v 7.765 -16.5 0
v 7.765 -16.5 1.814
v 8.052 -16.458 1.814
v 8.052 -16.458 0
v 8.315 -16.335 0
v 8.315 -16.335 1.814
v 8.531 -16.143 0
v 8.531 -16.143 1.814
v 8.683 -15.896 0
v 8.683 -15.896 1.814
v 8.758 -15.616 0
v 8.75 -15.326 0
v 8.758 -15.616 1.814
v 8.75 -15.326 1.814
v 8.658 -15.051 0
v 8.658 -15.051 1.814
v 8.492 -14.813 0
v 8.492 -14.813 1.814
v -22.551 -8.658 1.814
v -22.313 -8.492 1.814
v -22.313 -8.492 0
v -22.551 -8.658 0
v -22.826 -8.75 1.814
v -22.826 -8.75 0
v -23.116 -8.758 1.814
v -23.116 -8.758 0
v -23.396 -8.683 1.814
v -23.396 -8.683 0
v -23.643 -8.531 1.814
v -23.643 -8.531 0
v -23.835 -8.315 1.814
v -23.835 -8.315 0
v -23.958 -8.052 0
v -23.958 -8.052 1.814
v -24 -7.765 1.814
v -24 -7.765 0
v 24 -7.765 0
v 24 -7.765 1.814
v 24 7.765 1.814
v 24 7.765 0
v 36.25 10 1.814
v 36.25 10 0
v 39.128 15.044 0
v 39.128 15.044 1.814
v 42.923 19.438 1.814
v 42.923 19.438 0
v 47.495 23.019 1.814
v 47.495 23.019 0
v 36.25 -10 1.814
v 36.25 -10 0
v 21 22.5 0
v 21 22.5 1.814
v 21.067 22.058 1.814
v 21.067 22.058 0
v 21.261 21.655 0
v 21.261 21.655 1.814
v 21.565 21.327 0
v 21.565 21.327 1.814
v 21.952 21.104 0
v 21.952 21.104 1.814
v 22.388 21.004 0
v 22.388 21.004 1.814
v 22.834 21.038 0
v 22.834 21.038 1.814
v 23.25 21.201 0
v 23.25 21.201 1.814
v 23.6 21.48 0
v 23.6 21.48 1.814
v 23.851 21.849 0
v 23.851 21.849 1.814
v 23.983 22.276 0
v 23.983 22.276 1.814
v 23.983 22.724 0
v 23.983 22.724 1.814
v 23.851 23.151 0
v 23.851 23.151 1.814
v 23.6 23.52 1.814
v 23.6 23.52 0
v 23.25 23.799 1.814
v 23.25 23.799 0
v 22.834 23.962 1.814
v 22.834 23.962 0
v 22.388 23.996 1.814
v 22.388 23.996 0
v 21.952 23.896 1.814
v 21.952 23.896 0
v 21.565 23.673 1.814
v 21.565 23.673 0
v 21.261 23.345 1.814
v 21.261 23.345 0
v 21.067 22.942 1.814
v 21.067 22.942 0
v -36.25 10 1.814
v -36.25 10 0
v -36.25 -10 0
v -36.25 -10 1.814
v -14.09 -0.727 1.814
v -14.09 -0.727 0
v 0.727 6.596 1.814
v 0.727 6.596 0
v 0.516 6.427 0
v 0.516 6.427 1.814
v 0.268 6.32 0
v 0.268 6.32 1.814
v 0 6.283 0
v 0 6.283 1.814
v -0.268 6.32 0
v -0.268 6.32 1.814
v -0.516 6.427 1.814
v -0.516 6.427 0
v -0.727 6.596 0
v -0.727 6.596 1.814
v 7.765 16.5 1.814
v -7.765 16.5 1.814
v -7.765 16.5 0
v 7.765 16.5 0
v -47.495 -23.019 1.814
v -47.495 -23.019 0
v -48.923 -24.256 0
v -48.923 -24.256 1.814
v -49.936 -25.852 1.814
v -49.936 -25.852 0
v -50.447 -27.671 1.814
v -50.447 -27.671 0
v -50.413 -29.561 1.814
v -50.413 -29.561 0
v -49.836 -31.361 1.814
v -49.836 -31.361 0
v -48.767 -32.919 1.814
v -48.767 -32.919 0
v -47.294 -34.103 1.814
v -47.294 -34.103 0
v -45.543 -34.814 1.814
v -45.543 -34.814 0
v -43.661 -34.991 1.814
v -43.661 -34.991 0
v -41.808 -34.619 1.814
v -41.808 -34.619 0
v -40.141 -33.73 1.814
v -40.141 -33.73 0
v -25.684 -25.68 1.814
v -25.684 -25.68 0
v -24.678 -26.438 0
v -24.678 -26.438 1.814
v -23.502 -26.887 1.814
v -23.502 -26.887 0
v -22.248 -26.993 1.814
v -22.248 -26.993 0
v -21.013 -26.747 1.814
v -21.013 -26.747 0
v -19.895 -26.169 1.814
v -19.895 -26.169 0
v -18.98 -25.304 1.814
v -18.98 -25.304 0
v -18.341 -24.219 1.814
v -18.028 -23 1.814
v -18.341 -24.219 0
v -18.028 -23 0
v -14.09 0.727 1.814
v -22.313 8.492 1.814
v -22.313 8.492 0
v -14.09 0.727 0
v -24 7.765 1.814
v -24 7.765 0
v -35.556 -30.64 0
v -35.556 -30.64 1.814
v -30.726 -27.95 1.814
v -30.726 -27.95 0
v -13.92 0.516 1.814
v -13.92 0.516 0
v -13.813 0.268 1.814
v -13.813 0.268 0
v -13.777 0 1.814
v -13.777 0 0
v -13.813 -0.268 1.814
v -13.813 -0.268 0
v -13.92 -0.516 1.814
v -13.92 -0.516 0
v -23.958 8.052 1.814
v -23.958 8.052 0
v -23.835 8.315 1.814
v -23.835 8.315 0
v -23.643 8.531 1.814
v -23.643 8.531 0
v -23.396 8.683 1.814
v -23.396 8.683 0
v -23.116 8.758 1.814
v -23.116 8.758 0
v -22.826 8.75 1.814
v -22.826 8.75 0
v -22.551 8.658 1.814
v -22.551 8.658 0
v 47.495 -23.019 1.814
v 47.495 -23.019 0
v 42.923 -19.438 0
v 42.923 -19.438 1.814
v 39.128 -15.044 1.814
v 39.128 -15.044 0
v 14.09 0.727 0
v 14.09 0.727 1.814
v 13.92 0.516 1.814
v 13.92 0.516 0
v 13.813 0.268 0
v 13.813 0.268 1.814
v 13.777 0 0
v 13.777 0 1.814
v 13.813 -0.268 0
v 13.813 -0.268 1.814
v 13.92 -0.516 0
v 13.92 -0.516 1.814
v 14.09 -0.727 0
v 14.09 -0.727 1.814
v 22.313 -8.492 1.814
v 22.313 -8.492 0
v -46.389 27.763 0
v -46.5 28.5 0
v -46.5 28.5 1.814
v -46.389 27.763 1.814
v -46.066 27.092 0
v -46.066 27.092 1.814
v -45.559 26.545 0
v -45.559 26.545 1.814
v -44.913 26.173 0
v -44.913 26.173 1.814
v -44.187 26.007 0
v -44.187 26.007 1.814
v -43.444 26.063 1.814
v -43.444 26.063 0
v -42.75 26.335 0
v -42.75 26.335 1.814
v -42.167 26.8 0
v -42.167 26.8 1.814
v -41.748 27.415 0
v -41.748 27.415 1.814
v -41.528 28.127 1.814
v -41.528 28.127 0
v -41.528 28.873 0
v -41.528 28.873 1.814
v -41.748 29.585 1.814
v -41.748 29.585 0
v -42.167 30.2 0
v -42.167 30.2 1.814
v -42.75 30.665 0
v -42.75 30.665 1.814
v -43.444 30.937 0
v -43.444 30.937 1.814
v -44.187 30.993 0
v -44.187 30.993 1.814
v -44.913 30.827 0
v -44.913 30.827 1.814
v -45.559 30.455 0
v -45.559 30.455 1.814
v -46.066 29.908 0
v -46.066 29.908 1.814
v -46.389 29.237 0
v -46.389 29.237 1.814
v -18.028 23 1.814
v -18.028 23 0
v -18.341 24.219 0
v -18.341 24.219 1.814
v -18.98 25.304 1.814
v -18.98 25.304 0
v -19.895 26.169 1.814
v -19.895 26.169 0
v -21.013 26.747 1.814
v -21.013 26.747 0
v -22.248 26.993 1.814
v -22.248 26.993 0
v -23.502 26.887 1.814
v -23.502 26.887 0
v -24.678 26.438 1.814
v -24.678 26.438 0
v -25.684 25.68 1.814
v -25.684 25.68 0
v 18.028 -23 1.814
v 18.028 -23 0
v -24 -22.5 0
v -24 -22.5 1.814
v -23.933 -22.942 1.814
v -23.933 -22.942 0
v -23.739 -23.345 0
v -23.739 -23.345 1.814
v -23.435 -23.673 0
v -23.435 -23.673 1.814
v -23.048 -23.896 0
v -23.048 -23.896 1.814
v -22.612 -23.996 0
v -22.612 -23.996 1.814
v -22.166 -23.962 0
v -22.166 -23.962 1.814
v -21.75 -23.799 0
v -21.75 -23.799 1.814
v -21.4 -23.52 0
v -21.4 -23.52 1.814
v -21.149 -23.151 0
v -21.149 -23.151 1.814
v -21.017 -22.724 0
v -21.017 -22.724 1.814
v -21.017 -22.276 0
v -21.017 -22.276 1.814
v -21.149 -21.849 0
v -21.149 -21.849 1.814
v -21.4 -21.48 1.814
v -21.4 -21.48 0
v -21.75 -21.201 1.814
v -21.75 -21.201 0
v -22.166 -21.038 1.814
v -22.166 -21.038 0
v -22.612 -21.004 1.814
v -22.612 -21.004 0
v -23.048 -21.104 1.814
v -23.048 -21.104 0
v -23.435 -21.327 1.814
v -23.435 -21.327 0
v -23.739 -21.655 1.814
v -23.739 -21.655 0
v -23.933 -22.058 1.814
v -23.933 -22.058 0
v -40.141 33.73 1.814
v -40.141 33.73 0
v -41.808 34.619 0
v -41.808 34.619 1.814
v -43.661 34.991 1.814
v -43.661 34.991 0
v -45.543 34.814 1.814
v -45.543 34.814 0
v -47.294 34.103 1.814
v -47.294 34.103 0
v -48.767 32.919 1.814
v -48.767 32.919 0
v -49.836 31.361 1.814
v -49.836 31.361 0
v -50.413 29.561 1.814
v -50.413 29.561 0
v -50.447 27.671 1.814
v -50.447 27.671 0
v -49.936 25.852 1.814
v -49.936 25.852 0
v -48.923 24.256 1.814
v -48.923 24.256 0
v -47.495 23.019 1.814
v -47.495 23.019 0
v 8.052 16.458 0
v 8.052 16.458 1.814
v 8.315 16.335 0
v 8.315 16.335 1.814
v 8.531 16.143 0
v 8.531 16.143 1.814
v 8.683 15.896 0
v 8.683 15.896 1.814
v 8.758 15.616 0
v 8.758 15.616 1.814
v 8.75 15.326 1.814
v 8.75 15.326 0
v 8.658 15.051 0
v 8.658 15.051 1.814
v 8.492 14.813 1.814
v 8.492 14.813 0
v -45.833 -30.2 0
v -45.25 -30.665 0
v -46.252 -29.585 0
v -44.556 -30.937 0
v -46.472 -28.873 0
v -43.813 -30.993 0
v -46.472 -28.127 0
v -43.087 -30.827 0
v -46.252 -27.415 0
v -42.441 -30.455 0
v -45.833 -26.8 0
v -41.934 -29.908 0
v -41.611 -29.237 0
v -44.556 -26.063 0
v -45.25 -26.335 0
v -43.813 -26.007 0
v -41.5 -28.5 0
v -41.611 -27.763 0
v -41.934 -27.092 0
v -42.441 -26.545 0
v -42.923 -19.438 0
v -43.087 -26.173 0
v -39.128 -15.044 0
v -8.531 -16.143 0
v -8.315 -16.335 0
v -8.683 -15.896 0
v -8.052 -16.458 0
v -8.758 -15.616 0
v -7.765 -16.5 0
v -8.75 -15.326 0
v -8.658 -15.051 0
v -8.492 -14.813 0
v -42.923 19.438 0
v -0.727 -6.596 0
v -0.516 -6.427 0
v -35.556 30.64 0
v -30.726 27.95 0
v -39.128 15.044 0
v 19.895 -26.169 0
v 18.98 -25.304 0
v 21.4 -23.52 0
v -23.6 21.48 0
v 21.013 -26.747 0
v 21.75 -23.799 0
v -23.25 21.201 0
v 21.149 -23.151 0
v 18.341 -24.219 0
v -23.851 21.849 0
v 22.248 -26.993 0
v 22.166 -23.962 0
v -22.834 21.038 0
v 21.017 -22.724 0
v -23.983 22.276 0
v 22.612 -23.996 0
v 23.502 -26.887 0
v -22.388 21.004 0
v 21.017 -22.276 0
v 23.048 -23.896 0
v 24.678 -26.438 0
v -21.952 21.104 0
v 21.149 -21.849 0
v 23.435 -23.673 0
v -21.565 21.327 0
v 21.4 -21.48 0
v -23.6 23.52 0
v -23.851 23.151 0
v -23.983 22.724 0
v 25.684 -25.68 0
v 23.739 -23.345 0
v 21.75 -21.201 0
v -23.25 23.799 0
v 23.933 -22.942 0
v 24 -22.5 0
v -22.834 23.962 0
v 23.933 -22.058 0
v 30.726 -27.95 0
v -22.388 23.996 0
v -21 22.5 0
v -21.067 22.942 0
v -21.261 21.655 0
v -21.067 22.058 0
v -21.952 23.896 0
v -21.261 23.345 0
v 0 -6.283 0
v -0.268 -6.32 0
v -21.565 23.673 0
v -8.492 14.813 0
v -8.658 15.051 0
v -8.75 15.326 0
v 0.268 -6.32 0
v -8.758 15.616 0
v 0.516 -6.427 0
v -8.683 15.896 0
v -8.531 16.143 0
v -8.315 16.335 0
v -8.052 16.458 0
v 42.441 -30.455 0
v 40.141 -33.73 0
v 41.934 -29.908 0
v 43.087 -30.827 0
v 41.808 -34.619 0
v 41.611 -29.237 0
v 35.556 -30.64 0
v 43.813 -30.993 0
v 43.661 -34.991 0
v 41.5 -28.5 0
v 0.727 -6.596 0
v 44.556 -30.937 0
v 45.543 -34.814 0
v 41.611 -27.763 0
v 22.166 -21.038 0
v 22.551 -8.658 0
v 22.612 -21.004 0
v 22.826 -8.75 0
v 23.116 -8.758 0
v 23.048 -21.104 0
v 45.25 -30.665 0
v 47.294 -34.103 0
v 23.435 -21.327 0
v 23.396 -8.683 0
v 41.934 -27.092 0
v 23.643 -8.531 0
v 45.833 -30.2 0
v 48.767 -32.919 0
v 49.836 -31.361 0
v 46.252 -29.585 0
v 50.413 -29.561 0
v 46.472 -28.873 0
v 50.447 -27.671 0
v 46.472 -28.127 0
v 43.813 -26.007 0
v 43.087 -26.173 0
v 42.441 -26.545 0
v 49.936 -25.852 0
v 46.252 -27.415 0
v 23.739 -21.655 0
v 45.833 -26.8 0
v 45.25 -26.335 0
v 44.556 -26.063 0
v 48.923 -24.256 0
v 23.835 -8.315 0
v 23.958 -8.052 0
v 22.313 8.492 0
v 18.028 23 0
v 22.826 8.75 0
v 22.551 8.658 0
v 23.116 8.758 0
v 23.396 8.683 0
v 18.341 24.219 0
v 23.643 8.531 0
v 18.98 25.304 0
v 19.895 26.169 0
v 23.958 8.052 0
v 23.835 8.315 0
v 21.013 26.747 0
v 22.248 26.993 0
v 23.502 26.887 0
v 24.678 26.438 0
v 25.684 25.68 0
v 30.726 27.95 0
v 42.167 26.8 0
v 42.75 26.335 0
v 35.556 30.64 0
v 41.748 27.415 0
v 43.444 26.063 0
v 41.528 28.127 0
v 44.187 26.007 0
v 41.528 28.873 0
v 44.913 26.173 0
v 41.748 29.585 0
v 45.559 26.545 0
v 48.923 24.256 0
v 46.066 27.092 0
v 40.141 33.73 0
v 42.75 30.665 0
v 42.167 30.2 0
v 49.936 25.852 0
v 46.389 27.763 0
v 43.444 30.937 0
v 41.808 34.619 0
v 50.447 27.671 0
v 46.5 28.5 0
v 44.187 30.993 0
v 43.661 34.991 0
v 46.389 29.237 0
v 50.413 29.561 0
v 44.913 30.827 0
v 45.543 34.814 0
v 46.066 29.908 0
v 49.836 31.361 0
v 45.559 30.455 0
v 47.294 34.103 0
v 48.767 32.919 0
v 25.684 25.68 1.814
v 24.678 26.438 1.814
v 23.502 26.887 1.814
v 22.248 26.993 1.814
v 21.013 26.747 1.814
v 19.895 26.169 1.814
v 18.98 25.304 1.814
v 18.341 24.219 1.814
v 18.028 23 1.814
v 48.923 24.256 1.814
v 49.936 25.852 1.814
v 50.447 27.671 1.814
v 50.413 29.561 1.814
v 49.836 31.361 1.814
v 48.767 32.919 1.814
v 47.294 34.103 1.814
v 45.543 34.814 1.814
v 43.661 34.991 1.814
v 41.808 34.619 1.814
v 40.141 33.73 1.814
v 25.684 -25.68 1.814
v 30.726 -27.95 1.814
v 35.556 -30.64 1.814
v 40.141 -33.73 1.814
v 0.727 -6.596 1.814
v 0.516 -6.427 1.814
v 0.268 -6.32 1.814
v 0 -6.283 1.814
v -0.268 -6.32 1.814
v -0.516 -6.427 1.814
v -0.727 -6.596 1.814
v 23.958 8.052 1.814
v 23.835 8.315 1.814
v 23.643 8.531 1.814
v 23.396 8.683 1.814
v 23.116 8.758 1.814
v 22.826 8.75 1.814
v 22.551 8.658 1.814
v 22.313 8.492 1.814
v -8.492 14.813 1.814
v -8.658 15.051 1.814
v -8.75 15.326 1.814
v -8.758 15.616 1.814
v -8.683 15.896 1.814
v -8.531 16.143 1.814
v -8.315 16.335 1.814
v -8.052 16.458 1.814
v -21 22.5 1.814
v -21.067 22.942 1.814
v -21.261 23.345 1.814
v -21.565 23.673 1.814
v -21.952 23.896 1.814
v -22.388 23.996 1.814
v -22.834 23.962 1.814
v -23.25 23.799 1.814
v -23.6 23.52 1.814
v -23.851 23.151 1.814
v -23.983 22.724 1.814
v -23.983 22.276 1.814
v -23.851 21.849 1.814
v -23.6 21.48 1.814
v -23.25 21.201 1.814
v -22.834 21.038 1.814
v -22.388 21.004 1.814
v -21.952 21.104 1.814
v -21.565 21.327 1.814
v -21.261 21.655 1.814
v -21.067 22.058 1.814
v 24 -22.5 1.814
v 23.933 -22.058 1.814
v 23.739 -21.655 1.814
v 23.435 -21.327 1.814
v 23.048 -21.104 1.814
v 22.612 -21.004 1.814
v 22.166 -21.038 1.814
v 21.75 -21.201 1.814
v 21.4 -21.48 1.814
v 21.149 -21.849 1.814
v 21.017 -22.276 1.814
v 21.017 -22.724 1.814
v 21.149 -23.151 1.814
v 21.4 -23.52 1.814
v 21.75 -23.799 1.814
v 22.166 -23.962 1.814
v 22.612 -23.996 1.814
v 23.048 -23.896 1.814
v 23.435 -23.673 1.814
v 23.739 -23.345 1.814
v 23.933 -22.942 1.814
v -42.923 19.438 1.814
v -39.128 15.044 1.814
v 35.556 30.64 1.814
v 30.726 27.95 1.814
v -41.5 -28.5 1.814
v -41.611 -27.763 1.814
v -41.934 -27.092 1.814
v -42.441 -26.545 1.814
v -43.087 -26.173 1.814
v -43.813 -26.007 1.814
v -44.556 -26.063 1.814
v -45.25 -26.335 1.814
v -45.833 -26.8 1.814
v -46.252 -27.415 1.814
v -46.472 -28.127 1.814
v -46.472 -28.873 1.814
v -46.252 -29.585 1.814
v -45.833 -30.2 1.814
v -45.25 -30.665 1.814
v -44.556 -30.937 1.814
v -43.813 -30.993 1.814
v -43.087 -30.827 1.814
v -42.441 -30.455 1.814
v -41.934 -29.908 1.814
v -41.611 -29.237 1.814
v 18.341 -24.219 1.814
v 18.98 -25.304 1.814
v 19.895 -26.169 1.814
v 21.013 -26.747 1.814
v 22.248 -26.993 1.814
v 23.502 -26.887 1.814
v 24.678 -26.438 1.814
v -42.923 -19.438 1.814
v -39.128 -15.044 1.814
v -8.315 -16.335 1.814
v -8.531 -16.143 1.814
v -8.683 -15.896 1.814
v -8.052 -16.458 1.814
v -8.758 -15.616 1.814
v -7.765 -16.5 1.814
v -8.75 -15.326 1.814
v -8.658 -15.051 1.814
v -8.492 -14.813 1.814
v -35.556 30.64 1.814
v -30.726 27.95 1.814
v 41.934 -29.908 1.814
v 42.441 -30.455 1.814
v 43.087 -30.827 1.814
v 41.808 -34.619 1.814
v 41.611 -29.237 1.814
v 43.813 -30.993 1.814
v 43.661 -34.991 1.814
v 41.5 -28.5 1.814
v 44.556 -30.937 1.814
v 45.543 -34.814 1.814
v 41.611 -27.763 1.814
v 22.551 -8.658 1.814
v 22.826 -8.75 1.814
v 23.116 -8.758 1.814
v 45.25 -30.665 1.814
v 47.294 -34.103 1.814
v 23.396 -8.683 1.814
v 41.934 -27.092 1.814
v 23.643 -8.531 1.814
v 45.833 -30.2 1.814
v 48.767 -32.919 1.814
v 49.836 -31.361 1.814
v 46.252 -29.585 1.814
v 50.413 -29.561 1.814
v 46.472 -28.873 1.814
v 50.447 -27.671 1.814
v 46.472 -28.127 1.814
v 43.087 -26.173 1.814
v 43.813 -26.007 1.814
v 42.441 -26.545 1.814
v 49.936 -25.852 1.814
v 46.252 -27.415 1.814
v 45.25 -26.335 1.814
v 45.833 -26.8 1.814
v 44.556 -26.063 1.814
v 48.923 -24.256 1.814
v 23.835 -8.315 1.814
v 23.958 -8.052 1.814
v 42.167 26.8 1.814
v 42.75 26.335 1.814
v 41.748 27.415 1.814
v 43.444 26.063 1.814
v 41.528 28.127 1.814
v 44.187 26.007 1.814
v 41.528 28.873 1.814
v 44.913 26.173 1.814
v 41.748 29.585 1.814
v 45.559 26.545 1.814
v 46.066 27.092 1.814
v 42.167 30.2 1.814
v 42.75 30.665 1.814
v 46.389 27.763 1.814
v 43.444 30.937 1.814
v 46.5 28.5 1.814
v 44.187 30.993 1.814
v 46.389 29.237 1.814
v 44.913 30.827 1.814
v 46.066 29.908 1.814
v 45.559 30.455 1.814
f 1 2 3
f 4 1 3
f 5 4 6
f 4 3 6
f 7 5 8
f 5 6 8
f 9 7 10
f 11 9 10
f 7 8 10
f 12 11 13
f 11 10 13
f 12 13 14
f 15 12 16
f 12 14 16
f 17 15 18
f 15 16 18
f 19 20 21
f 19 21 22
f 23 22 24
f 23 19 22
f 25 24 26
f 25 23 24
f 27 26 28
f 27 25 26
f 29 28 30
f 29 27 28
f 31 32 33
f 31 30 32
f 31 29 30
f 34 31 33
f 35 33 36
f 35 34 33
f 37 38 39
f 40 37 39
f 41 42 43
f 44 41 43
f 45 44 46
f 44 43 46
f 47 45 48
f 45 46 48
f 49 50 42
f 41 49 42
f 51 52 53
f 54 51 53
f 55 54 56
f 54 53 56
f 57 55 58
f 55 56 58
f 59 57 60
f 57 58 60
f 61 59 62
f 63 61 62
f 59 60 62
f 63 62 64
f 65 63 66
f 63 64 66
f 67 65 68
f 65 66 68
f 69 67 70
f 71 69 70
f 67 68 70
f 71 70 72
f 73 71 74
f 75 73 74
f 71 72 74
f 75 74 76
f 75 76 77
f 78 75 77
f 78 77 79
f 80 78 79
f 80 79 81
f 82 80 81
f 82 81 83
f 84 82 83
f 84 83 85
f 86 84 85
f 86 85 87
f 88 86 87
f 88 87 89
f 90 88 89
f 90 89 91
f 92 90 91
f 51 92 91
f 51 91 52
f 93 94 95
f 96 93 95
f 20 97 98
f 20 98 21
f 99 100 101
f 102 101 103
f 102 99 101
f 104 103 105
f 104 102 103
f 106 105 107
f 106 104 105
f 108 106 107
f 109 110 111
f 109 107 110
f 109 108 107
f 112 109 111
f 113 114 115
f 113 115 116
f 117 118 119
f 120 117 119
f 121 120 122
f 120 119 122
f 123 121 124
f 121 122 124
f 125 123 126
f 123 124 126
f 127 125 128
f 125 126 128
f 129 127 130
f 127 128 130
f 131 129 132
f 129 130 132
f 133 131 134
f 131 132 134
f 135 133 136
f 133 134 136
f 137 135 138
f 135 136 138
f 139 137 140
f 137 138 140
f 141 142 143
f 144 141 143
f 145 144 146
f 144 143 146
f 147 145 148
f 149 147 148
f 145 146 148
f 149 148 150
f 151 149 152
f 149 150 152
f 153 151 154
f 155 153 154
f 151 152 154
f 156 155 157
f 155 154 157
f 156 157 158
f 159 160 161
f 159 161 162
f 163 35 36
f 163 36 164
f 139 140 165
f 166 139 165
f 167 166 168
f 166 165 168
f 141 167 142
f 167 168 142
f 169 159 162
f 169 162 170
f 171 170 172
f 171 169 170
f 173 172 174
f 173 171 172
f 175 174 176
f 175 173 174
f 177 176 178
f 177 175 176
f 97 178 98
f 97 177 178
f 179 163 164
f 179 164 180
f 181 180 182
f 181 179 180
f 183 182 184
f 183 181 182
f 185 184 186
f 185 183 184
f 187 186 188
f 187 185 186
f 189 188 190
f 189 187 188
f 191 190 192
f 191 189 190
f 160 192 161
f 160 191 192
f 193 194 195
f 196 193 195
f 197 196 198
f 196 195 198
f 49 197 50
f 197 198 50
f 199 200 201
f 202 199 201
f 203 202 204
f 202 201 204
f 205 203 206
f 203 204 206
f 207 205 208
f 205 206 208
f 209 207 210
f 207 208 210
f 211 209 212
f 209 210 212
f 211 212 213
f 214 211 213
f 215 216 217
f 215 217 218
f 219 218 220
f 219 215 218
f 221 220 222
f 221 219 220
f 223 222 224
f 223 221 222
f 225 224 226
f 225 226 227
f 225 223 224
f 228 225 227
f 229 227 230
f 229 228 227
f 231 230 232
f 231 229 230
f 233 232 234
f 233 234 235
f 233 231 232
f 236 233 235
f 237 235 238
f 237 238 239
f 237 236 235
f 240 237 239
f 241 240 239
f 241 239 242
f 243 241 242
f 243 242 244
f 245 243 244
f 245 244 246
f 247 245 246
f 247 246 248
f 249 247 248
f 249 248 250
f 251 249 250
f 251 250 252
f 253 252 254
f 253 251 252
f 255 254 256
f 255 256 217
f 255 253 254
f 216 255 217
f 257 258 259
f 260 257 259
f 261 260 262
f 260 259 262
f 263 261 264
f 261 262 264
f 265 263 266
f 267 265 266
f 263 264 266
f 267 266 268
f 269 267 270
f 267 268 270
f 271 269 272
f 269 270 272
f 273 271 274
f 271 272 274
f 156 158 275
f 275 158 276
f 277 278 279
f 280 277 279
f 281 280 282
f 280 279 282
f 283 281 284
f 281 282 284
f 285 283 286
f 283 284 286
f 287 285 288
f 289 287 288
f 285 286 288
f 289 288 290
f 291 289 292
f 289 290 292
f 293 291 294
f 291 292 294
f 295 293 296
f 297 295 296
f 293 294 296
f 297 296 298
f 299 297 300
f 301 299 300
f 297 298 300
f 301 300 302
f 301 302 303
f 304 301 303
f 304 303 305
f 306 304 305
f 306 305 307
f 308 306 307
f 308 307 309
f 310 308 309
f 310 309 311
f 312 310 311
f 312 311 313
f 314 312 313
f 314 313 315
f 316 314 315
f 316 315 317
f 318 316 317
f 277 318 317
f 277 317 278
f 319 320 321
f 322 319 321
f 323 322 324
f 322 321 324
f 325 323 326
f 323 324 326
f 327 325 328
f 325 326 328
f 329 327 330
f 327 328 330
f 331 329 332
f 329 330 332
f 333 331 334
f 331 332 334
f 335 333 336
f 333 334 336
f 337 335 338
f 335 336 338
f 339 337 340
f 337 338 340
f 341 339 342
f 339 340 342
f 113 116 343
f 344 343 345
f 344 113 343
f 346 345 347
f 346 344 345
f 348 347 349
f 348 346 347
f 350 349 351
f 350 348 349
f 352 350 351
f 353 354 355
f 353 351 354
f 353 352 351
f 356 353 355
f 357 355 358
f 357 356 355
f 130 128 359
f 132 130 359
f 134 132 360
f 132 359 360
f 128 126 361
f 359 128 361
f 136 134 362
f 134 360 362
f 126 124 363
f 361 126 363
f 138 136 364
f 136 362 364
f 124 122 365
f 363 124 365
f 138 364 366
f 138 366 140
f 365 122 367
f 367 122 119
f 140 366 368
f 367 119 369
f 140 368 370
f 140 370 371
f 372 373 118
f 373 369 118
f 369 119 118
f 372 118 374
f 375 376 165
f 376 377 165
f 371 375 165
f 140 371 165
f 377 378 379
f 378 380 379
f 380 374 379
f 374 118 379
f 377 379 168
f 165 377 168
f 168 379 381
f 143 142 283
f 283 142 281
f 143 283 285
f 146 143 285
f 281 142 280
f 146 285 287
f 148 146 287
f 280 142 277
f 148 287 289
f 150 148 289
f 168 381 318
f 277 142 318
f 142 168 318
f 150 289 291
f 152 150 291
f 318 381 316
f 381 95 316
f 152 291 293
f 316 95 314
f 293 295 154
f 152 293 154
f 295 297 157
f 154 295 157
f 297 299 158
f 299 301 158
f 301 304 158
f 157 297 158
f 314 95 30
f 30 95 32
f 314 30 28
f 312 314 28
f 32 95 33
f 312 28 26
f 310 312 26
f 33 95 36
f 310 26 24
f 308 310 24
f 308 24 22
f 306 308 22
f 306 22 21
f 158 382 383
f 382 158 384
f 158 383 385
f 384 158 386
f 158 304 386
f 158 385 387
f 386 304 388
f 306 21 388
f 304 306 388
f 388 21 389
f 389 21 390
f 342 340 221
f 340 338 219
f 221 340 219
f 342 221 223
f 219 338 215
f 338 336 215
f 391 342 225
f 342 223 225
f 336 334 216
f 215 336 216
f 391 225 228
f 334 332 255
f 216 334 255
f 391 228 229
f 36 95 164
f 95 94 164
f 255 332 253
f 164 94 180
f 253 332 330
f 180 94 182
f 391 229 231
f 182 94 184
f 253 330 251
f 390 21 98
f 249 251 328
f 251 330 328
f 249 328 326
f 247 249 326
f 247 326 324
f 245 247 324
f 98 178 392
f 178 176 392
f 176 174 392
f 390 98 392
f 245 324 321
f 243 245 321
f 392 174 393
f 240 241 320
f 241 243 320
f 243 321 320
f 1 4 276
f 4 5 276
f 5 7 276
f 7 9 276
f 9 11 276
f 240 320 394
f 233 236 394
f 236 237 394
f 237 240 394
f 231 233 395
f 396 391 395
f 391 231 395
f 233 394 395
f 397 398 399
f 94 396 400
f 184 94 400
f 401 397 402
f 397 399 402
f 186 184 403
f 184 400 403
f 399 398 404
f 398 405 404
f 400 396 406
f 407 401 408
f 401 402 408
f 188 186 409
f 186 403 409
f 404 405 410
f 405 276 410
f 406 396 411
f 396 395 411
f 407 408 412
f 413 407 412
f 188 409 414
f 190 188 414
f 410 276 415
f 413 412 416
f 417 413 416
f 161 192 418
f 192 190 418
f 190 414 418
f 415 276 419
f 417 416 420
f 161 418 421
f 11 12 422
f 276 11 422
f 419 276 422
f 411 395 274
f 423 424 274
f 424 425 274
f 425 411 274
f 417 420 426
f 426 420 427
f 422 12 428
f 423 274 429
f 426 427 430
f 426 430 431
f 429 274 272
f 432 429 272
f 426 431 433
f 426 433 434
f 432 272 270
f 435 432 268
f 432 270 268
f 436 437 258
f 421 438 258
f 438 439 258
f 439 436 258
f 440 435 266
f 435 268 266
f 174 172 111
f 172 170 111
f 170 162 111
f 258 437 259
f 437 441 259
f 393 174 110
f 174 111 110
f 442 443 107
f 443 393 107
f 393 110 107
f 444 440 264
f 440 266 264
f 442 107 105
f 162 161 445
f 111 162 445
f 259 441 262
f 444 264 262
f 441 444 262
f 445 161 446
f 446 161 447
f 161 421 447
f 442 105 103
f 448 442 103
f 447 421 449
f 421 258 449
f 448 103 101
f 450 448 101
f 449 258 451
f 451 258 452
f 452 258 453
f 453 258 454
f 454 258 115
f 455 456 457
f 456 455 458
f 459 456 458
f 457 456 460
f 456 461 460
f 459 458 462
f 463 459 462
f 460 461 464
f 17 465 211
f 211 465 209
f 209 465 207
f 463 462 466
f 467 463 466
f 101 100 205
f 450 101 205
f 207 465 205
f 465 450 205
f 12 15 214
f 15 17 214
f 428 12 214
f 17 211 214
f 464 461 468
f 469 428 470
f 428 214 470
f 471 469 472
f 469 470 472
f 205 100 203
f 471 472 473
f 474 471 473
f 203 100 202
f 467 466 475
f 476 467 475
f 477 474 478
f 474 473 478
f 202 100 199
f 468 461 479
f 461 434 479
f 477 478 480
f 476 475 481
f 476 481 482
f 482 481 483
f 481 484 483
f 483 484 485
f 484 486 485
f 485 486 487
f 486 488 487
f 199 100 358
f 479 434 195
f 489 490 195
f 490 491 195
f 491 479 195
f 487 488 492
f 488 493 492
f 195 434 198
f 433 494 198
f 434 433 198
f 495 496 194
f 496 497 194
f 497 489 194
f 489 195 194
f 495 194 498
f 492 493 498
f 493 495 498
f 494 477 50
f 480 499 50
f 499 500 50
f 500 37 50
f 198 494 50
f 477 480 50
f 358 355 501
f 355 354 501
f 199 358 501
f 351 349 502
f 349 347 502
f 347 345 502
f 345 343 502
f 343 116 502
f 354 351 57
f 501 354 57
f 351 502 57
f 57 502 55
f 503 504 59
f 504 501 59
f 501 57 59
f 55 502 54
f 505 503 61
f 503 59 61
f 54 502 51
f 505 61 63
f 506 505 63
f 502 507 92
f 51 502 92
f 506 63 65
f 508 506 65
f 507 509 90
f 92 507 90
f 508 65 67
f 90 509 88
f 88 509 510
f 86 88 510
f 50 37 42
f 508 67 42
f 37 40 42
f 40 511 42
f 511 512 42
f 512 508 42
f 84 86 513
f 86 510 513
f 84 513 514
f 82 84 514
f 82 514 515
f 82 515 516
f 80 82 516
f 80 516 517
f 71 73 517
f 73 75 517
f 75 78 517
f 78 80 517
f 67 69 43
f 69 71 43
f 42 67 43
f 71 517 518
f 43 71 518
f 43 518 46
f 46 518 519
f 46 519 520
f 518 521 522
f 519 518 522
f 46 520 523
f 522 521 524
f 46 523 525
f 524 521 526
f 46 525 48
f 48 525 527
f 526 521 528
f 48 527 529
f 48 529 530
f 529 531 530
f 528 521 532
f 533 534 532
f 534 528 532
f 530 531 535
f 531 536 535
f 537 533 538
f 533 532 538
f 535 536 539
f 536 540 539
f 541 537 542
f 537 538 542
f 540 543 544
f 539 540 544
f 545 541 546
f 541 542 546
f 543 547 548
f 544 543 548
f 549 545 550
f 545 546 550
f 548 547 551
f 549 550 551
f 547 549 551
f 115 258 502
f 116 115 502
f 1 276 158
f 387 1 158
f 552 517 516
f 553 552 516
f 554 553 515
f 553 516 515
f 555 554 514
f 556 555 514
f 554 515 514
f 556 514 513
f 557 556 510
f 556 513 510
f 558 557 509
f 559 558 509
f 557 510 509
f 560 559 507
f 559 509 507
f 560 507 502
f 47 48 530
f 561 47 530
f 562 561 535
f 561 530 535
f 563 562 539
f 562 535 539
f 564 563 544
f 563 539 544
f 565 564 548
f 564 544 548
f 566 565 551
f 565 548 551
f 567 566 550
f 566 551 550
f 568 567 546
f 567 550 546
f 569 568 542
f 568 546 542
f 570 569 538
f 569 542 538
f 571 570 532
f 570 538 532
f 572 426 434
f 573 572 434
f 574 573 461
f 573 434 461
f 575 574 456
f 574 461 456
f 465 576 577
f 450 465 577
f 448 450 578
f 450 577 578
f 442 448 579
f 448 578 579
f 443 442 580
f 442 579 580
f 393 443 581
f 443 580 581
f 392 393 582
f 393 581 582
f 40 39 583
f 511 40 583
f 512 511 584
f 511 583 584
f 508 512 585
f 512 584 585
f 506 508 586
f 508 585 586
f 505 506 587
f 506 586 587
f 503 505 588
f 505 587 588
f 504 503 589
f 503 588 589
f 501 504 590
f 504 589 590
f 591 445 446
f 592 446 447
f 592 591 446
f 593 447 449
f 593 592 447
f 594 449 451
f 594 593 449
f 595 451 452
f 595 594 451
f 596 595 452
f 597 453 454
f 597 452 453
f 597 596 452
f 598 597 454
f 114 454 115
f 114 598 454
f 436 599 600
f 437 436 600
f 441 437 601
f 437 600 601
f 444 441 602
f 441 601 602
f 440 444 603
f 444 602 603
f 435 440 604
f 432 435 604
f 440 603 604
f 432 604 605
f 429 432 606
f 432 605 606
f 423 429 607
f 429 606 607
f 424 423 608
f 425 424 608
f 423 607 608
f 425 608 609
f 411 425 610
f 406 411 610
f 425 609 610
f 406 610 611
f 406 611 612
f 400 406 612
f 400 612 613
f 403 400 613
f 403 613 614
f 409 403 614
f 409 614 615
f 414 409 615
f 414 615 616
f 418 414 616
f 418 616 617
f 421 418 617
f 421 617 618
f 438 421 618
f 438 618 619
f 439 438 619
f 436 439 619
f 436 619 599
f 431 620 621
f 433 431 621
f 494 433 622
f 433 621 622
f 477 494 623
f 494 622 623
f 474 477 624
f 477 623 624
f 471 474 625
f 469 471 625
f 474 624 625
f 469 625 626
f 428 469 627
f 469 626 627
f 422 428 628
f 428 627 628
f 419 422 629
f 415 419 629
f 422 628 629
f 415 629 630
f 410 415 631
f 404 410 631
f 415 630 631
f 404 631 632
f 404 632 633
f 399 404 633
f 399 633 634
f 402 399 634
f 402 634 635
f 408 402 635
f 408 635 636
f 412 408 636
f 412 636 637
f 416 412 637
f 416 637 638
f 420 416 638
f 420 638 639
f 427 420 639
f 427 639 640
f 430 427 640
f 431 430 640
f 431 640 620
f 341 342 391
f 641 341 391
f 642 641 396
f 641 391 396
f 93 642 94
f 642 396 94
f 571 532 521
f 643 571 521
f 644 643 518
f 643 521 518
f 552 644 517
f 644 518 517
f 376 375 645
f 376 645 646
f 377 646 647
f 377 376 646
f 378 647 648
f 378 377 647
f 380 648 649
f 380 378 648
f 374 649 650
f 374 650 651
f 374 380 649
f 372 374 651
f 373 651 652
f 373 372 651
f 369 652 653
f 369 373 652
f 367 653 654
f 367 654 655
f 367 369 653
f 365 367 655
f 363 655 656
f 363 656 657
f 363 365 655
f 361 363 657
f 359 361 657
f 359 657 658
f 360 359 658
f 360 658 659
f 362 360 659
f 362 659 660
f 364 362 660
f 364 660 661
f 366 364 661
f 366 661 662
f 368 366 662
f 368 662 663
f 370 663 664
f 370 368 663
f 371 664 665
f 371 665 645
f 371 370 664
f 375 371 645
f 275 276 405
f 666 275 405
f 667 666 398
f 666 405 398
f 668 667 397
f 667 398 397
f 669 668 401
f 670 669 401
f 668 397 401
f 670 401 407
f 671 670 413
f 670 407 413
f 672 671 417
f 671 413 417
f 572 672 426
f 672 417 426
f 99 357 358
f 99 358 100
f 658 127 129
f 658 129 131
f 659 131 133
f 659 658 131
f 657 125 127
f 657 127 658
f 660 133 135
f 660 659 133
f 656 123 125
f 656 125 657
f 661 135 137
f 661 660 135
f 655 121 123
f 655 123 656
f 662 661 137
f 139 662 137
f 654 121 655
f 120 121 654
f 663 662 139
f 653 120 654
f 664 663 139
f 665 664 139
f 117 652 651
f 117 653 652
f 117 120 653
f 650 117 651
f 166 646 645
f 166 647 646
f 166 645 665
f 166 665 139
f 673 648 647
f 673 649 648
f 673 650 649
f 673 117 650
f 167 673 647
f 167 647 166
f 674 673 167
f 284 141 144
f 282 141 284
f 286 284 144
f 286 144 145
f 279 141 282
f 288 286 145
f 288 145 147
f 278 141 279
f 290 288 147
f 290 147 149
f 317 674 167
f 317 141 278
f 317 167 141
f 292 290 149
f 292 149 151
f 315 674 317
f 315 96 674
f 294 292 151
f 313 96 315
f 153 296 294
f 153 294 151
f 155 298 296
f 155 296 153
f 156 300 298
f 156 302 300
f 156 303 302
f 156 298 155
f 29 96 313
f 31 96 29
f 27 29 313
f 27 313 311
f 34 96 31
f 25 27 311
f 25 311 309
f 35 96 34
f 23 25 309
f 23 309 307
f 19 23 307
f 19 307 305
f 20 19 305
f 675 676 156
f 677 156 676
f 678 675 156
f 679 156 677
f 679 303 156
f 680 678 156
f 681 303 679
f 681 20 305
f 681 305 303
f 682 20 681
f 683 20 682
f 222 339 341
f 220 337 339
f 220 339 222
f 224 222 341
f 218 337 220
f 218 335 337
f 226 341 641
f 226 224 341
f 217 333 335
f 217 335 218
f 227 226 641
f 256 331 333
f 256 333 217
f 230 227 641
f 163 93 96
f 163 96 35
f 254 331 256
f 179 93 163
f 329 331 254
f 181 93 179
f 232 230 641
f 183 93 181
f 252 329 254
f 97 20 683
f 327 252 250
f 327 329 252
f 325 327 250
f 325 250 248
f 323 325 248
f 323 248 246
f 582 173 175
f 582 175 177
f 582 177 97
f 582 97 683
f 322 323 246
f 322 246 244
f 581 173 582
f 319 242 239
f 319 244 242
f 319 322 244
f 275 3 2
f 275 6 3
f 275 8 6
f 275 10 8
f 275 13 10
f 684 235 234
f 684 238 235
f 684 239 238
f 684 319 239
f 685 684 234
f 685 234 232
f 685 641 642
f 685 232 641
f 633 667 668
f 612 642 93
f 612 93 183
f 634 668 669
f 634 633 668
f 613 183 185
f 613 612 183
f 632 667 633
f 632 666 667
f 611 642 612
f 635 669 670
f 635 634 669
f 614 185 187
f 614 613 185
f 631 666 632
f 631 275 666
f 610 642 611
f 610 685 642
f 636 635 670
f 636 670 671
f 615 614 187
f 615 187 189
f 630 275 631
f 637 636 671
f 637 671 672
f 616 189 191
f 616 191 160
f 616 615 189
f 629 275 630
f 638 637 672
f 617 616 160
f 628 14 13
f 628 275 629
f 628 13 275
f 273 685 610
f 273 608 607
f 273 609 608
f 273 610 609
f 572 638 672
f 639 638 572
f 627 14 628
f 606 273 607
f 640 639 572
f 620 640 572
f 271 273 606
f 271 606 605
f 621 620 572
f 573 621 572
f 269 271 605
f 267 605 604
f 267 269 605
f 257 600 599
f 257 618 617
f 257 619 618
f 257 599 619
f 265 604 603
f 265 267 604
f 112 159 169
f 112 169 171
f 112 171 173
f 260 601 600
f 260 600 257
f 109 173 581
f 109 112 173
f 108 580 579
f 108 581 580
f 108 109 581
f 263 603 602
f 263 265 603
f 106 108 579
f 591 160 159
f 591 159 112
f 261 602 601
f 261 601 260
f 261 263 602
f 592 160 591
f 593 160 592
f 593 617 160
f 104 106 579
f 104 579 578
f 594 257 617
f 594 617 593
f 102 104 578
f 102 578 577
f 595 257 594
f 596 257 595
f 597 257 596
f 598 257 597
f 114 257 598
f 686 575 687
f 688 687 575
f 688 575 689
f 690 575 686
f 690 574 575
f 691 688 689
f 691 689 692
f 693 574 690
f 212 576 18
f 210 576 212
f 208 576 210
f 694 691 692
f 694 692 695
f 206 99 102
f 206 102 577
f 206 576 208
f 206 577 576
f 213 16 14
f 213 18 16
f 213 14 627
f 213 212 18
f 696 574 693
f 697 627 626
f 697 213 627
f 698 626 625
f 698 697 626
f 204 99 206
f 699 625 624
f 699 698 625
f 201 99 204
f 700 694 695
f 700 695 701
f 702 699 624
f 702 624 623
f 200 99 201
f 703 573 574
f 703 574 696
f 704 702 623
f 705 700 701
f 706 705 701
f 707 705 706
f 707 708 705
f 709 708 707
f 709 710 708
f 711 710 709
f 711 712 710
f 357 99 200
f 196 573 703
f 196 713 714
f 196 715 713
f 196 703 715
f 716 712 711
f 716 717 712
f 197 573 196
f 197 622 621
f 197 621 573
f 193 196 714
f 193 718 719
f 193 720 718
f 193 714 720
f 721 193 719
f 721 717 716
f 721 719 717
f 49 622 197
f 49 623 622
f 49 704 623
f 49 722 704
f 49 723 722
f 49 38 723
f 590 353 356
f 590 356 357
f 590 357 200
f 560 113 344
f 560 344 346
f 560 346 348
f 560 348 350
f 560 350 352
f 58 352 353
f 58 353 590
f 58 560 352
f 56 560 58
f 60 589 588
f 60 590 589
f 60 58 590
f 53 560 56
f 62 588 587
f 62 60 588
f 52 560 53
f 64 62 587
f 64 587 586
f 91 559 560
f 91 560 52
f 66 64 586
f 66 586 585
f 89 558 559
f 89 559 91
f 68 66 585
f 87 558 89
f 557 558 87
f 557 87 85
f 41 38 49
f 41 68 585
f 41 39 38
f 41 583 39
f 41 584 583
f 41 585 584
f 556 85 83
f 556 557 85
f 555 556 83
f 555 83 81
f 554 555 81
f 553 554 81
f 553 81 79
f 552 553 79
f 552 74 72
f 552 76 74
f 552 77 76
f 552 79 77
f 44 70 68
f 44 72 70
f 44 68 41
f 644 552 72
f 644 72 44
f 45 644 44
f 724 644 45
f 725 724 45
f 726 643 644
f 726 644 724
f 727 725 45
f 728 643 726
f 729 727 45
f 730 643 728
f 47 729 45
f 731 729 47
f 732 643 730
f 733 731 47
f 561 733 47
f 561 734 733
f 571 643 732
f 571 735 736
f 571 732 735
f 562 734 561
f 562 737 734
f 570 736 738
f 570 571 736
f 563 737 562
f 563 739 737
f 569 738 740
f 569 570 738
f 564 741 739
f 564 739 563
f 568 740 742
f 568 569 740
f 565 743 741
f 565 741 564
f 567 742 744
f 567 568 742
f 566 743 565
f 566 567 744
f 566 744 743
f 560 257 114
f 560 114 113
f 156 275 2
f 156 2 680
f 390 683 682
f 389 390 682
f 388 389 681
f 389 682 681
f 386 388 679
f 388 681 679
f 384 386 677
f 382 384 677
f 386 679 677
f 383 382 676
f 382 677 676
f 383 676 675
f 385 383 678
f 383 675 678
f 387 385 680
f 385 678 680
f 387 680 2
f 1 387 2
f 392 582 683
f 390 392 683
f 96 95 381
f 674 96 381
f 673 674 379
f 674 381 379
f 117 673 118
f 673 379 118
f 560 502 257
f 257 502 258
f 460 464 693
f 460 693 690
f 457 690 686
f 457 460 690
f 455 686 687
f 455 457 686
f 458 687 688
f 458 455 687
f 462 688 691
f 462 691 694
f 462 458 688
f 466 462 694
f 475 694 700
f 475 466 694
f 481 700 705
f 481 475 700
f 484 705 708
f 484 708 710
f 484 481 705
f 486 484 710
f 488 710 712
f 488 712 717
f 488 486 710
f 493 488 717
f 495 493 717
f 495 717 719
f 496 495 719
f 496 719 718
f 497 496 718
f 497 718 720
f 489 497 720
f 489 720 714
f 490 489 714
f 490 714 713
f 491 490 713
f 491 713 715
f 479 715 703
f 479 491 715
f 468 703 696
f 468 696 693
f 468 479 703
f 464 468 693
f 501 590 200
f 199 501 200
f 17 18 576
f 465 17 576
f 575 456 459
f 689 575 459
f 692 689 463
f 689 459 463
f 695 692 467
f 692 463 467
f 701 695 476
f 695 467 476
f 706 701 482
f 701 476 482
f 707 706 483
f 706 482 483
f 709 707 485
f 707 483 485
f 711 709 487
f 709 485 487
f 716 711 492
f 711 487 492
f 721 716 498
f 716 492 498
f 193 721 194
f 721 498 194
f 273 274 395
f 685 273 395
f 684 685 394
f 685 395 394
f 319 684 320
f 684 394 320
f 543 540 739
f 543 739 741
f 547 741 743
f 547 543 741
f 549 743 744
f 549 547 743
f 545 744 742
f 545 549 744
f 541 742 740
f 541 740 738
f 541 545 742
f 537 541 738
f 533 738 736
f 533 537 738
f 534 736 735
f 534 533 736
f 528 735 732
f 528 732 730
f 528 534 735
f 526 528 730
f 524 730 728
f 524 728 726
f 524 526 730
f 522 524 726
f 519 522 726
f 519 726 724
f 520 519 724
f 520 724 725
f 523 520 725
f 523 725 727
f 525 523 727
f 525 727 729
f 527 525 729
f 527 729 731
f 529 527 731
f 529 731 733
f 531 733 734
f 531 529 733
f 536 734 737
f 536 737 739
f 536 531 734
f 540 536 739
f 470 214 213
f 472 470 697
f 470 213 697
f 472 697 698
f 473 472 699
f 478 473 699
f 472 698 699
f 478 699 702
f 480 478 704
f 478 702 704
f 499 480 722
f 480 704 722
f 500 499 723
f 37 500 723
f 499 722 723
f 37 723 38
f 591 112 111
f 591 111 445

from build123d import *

# Parameters (mm, degrees)
SKETCH1_R           = 2.5
BOSS_EXTRUDE1_DEPTH = 1.813873007
SKETCH2_R           = 1.5
CUT_EXTRUDE1_DEPTH  = 62.469831099


with BuildPart() as part:
    # Sketch1 → Boss-Extrude1 (new body)
    with BuildSketch(Plane.XY):
        with BuildLine():
            Line((36.25, -10), (36.25, 10))
            ThreePointArc((36.25, 10), (40.919052696, 17.33292647), (47.494545324, 23.019292657))
            ThreePointArc((47.494545324, 23.019292657), (49.358557668, 32.179111268), (40.140588391, 33.730195219))
            ThreePointArc((40.140588391, 33.730195219), (33.169485012, 29.243195432), (25.683959799, 25.68))
            ThreePointArc((25.683959799, 25.68), (21.013241966, 26.747299206), (18.027864045, 23))
            Line((18.027864045, 23), (-18.027864045, 23))
            ThreePointArc((-18.027864045, 23), (-21.013241966, 26.747299206), (-25.683959799, 25.68))
            ThreePointArc((-25.683959799, 25.68), (-33.169485012, 29.243195432), (-40.140588391, 33.730195219))
            ThreePointArc((-40.140588391, 33.730195219), (-49.358557668, 32.179111268), (-47.494545324, 23.019292657))
            ThreePointArc((-47.494545324, 23.019292657), (-40.919052696, 17.33292647), (-36.25, 10))
            Line((-36.25, 10), (-36.25, -10))
            ThreePointArc((-36.25, -10), (-40.919052696, -17.33292647), (-47.494545324, -23.019292657))
            ThreePointArc((-47.494545324, -23.019292657), (-49.358557668, -32.179111268), (-40.140588391, -33.730195219))
            ThreePointArc((-40.140588391, -33.730195219), (-33.169485012, -29.243195432), (-25.683959799, -25.68))
            ThreePointArc((-25.683959799, -25.68), (-21.013241966, -26.747299206), (-18.027864045, -23))
            Line((-18.027864045, -23), (18.027864045, -23))
            ThreePointArc((18.027864045, -23), (21.013241966, -26.747299206), (25.683959799, -25.68))
            ThreePointArc((25.683959799, -25.68), (33.169485012, -29.243195432), (40.140588391, -33.730195219))
            ThreePointArc((40.140588391, -33.730195219), (49.358557668, -32.179111268), (47.494545324, -23.019292657))
            ThreePointArc((47.494545324, -23.019292657), (40.919052696, -17.33292647), (36.25, -10))
        make_face()
        with Locations((-44, -28.5)):
            Circle(SKETCH1_R, mode=Mode.SUBTRACT)
        with Locations(Location((-44, 28.5, 0), (0, 0, 180))):
            Circle(SKETCH1_R, mode=Mode.SUBTRACT)
        with Locations(Location((44, -28.5, 0), (0, 0, 180))):
            Circle(SKETCH1_R, mode=Mode.SUBTRACT)
        with Locations((44, 28.5)):
            Circle(SKETCH1_R, mode=Mode.SUBTRACT)
    extrude(amount=BOSS_EXTRUDE1_DEPTH)

    # Sketch2 → Cut-Extrude1 (cut, through all)
    with BuildSketch(Plane.XY.offset(1.813873007)):
        with Locations((-22.5, 22.5)):
            Circle(SKETCH2_R)
        with Locations(Location((-22.5, -22.5, 0), (0, 0, 180))):
            Circle(SKETCH2_R)
        with Locations((22.5, -22.5)):
            Circle(SKETCH2_R)
        with Locations(Location((22.5, 22.5, 0), (0, 0, 180))):
            Circle(SKETCH2_R)
        with BuildLine():
            Line((-7.765, 16.5), (7.765, 16.5))
            ThreePointArc((7.765, 16.5), (8.68337839, 15.89570334), (8.491810792, 14.813162266))
            Line((8.491810792, 14.813162266), (0.726810792, 6.596249413))
            ThreePointArc((0.726810792, 6.596249413), (0, 6.283087147), (-0.726810792, 6.596249413))
            Line((-0.726810792, 6.596249413), (-8.491810792, 14.813162266))
            ThreePointArc((-8.491810792, 14.813162266), (-8.68337839, 15.89570334), (-7.765, 16.5))
        make_face()
        with BuildLine():
            Line((-7.765, -16.5), (7.765, -16.5))
            ThreePointArc((7.765, -16.5), (8.68337839, -15.89570334), (8.491810792, -14.813162266))
            Line((8.491810792, -14.813162266), (0.726810792, -6.596249413))
            ThreePointArc((0.726810792, -6.596249413), (0, -6.283087147), (-0.726810792, -6.596249413))
            Line((-0.726810792, -6.596249413), (-8.491810792, -14.813162266))
            ThreePointArc((-8.491810792, -14.813162266), (-8.68337839, -15.89570334), (-7.765, -16.5))
        make_face()
        with BuildLine():
            Line((-24, -7.765), (-24, 7.765))
            ThreePointArc((-24, 7.765), (-23.395885369, 8.683299937), (-22.31345045, 8.492083019))
            Line((-22.31345045, 8.492083019), (-14.090009559, 0.727083019))
            ThreePointArc((-14.090009559, 0.727083019), (-13.776559109, 0), (-14.090009559, -0.727083019))
            Line((-14.090009559, -0.727083019), (-22.31345045, -8.492083019))
            ThreePointArc((-22.31345045, -8.492083019), (-23.395885369, -8.683299937), (-24, -7.765))
        make_face()
        with BuildLine():
            Line((24, -7.765), (24, 7.765))
            ThreePointArc((24, 7.765), (23.395885369, 8.683299937), (22.31345045, 8.492083019))
            Line((22.31345045, 8.492083019), (14.090009559, 0.727083019))
            ThreePointArc((14.090009559, 0.727083019), (13.776559109, 0), (14.090009559, -0.727083019))
            Line((14.090009559, -0.727083019), (22.31345045, -8.492083019))
            ThreePointArc((22.31345045, -8.492083019), (23.395885369, -8.683299937), (24, -7.765))
        make_face()
    extrude(amount=-CUT_EXTRUDE1_DEPTH, mode=Mode.SUBTRACT)


solid = part.part
